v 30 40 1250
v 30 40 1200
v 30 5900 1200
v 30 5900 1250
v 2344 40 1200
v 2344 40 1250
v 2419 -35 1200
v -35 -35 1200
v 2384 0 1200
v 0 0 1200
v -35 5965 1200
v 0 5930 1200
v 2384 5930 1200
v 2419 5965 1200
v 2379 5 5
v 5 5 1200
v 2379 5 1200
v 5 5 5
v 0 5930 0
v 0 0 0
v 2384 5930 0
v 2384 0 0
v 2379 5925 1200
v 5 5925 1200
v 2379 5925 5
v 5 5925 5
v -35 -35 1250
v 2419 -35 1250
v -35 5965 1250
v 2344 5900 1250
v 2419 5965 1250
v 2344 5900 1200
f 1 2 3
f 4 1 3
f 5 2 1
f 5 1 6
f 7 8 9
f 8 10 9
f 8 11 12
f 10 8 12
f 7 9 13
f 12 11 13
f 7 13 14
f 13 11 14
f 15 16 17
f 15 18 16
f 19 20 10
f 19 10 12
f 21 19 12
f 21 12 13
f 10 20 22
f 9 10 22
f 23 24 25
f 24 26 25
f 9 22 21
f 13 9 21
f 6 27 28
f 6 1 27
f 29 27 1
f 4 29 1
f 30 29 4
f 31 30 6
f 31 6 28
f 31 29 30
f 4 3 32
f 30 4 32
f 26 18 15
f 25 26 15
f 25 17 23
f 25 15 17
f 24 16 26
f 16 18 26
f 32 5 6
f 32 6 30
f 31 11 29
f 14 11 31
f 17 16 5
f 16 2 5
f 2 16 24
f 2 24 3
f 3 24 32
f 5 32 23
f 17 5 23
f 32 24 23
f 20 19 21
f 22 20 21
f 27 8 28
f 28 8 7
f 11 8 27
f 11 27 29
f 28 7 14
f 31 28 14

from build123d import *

# Parameters (mm, degrees)
F0_W     = 2384
F0_H     = 5930
F1_DEPTH = 1200
F2_T     = -5
F3_W     = 2454
F3_H     = 6000
F3_W_2   = 2314
F3_H_2   = 5860
F4_DEPTH = 50


with BuildPart() as f1:
    # F0 (on Top) → F1 (new body)
    with BuildSketch(Plane.XY):
        with Locations((1192, 2965)):
            Rectangle(F0_W, F0_H)
    extrude(amount=F1_DEPTH)

    # F2
    f2_openings = [f1.faces().sort_by_distance(p)[0] for p in [
        (1192, 2965, 1200),
    ]]
    offset(amount=F2_T, openings=f2_openings)

    # F3 (on face) → F4 (join)
    with BuildSketch(Plane.XY.offset(1200)):
        with Locations((1192, 2965)):
            Rectangle(F3_W, F3_H)
        with Locations((1187, 2970)):
            Rectangle(F3_W_2, F3_H_2, mode=Mode.SUBTRACT)
    extrude(amount=F4_DEPTH)


solid = f1.part
